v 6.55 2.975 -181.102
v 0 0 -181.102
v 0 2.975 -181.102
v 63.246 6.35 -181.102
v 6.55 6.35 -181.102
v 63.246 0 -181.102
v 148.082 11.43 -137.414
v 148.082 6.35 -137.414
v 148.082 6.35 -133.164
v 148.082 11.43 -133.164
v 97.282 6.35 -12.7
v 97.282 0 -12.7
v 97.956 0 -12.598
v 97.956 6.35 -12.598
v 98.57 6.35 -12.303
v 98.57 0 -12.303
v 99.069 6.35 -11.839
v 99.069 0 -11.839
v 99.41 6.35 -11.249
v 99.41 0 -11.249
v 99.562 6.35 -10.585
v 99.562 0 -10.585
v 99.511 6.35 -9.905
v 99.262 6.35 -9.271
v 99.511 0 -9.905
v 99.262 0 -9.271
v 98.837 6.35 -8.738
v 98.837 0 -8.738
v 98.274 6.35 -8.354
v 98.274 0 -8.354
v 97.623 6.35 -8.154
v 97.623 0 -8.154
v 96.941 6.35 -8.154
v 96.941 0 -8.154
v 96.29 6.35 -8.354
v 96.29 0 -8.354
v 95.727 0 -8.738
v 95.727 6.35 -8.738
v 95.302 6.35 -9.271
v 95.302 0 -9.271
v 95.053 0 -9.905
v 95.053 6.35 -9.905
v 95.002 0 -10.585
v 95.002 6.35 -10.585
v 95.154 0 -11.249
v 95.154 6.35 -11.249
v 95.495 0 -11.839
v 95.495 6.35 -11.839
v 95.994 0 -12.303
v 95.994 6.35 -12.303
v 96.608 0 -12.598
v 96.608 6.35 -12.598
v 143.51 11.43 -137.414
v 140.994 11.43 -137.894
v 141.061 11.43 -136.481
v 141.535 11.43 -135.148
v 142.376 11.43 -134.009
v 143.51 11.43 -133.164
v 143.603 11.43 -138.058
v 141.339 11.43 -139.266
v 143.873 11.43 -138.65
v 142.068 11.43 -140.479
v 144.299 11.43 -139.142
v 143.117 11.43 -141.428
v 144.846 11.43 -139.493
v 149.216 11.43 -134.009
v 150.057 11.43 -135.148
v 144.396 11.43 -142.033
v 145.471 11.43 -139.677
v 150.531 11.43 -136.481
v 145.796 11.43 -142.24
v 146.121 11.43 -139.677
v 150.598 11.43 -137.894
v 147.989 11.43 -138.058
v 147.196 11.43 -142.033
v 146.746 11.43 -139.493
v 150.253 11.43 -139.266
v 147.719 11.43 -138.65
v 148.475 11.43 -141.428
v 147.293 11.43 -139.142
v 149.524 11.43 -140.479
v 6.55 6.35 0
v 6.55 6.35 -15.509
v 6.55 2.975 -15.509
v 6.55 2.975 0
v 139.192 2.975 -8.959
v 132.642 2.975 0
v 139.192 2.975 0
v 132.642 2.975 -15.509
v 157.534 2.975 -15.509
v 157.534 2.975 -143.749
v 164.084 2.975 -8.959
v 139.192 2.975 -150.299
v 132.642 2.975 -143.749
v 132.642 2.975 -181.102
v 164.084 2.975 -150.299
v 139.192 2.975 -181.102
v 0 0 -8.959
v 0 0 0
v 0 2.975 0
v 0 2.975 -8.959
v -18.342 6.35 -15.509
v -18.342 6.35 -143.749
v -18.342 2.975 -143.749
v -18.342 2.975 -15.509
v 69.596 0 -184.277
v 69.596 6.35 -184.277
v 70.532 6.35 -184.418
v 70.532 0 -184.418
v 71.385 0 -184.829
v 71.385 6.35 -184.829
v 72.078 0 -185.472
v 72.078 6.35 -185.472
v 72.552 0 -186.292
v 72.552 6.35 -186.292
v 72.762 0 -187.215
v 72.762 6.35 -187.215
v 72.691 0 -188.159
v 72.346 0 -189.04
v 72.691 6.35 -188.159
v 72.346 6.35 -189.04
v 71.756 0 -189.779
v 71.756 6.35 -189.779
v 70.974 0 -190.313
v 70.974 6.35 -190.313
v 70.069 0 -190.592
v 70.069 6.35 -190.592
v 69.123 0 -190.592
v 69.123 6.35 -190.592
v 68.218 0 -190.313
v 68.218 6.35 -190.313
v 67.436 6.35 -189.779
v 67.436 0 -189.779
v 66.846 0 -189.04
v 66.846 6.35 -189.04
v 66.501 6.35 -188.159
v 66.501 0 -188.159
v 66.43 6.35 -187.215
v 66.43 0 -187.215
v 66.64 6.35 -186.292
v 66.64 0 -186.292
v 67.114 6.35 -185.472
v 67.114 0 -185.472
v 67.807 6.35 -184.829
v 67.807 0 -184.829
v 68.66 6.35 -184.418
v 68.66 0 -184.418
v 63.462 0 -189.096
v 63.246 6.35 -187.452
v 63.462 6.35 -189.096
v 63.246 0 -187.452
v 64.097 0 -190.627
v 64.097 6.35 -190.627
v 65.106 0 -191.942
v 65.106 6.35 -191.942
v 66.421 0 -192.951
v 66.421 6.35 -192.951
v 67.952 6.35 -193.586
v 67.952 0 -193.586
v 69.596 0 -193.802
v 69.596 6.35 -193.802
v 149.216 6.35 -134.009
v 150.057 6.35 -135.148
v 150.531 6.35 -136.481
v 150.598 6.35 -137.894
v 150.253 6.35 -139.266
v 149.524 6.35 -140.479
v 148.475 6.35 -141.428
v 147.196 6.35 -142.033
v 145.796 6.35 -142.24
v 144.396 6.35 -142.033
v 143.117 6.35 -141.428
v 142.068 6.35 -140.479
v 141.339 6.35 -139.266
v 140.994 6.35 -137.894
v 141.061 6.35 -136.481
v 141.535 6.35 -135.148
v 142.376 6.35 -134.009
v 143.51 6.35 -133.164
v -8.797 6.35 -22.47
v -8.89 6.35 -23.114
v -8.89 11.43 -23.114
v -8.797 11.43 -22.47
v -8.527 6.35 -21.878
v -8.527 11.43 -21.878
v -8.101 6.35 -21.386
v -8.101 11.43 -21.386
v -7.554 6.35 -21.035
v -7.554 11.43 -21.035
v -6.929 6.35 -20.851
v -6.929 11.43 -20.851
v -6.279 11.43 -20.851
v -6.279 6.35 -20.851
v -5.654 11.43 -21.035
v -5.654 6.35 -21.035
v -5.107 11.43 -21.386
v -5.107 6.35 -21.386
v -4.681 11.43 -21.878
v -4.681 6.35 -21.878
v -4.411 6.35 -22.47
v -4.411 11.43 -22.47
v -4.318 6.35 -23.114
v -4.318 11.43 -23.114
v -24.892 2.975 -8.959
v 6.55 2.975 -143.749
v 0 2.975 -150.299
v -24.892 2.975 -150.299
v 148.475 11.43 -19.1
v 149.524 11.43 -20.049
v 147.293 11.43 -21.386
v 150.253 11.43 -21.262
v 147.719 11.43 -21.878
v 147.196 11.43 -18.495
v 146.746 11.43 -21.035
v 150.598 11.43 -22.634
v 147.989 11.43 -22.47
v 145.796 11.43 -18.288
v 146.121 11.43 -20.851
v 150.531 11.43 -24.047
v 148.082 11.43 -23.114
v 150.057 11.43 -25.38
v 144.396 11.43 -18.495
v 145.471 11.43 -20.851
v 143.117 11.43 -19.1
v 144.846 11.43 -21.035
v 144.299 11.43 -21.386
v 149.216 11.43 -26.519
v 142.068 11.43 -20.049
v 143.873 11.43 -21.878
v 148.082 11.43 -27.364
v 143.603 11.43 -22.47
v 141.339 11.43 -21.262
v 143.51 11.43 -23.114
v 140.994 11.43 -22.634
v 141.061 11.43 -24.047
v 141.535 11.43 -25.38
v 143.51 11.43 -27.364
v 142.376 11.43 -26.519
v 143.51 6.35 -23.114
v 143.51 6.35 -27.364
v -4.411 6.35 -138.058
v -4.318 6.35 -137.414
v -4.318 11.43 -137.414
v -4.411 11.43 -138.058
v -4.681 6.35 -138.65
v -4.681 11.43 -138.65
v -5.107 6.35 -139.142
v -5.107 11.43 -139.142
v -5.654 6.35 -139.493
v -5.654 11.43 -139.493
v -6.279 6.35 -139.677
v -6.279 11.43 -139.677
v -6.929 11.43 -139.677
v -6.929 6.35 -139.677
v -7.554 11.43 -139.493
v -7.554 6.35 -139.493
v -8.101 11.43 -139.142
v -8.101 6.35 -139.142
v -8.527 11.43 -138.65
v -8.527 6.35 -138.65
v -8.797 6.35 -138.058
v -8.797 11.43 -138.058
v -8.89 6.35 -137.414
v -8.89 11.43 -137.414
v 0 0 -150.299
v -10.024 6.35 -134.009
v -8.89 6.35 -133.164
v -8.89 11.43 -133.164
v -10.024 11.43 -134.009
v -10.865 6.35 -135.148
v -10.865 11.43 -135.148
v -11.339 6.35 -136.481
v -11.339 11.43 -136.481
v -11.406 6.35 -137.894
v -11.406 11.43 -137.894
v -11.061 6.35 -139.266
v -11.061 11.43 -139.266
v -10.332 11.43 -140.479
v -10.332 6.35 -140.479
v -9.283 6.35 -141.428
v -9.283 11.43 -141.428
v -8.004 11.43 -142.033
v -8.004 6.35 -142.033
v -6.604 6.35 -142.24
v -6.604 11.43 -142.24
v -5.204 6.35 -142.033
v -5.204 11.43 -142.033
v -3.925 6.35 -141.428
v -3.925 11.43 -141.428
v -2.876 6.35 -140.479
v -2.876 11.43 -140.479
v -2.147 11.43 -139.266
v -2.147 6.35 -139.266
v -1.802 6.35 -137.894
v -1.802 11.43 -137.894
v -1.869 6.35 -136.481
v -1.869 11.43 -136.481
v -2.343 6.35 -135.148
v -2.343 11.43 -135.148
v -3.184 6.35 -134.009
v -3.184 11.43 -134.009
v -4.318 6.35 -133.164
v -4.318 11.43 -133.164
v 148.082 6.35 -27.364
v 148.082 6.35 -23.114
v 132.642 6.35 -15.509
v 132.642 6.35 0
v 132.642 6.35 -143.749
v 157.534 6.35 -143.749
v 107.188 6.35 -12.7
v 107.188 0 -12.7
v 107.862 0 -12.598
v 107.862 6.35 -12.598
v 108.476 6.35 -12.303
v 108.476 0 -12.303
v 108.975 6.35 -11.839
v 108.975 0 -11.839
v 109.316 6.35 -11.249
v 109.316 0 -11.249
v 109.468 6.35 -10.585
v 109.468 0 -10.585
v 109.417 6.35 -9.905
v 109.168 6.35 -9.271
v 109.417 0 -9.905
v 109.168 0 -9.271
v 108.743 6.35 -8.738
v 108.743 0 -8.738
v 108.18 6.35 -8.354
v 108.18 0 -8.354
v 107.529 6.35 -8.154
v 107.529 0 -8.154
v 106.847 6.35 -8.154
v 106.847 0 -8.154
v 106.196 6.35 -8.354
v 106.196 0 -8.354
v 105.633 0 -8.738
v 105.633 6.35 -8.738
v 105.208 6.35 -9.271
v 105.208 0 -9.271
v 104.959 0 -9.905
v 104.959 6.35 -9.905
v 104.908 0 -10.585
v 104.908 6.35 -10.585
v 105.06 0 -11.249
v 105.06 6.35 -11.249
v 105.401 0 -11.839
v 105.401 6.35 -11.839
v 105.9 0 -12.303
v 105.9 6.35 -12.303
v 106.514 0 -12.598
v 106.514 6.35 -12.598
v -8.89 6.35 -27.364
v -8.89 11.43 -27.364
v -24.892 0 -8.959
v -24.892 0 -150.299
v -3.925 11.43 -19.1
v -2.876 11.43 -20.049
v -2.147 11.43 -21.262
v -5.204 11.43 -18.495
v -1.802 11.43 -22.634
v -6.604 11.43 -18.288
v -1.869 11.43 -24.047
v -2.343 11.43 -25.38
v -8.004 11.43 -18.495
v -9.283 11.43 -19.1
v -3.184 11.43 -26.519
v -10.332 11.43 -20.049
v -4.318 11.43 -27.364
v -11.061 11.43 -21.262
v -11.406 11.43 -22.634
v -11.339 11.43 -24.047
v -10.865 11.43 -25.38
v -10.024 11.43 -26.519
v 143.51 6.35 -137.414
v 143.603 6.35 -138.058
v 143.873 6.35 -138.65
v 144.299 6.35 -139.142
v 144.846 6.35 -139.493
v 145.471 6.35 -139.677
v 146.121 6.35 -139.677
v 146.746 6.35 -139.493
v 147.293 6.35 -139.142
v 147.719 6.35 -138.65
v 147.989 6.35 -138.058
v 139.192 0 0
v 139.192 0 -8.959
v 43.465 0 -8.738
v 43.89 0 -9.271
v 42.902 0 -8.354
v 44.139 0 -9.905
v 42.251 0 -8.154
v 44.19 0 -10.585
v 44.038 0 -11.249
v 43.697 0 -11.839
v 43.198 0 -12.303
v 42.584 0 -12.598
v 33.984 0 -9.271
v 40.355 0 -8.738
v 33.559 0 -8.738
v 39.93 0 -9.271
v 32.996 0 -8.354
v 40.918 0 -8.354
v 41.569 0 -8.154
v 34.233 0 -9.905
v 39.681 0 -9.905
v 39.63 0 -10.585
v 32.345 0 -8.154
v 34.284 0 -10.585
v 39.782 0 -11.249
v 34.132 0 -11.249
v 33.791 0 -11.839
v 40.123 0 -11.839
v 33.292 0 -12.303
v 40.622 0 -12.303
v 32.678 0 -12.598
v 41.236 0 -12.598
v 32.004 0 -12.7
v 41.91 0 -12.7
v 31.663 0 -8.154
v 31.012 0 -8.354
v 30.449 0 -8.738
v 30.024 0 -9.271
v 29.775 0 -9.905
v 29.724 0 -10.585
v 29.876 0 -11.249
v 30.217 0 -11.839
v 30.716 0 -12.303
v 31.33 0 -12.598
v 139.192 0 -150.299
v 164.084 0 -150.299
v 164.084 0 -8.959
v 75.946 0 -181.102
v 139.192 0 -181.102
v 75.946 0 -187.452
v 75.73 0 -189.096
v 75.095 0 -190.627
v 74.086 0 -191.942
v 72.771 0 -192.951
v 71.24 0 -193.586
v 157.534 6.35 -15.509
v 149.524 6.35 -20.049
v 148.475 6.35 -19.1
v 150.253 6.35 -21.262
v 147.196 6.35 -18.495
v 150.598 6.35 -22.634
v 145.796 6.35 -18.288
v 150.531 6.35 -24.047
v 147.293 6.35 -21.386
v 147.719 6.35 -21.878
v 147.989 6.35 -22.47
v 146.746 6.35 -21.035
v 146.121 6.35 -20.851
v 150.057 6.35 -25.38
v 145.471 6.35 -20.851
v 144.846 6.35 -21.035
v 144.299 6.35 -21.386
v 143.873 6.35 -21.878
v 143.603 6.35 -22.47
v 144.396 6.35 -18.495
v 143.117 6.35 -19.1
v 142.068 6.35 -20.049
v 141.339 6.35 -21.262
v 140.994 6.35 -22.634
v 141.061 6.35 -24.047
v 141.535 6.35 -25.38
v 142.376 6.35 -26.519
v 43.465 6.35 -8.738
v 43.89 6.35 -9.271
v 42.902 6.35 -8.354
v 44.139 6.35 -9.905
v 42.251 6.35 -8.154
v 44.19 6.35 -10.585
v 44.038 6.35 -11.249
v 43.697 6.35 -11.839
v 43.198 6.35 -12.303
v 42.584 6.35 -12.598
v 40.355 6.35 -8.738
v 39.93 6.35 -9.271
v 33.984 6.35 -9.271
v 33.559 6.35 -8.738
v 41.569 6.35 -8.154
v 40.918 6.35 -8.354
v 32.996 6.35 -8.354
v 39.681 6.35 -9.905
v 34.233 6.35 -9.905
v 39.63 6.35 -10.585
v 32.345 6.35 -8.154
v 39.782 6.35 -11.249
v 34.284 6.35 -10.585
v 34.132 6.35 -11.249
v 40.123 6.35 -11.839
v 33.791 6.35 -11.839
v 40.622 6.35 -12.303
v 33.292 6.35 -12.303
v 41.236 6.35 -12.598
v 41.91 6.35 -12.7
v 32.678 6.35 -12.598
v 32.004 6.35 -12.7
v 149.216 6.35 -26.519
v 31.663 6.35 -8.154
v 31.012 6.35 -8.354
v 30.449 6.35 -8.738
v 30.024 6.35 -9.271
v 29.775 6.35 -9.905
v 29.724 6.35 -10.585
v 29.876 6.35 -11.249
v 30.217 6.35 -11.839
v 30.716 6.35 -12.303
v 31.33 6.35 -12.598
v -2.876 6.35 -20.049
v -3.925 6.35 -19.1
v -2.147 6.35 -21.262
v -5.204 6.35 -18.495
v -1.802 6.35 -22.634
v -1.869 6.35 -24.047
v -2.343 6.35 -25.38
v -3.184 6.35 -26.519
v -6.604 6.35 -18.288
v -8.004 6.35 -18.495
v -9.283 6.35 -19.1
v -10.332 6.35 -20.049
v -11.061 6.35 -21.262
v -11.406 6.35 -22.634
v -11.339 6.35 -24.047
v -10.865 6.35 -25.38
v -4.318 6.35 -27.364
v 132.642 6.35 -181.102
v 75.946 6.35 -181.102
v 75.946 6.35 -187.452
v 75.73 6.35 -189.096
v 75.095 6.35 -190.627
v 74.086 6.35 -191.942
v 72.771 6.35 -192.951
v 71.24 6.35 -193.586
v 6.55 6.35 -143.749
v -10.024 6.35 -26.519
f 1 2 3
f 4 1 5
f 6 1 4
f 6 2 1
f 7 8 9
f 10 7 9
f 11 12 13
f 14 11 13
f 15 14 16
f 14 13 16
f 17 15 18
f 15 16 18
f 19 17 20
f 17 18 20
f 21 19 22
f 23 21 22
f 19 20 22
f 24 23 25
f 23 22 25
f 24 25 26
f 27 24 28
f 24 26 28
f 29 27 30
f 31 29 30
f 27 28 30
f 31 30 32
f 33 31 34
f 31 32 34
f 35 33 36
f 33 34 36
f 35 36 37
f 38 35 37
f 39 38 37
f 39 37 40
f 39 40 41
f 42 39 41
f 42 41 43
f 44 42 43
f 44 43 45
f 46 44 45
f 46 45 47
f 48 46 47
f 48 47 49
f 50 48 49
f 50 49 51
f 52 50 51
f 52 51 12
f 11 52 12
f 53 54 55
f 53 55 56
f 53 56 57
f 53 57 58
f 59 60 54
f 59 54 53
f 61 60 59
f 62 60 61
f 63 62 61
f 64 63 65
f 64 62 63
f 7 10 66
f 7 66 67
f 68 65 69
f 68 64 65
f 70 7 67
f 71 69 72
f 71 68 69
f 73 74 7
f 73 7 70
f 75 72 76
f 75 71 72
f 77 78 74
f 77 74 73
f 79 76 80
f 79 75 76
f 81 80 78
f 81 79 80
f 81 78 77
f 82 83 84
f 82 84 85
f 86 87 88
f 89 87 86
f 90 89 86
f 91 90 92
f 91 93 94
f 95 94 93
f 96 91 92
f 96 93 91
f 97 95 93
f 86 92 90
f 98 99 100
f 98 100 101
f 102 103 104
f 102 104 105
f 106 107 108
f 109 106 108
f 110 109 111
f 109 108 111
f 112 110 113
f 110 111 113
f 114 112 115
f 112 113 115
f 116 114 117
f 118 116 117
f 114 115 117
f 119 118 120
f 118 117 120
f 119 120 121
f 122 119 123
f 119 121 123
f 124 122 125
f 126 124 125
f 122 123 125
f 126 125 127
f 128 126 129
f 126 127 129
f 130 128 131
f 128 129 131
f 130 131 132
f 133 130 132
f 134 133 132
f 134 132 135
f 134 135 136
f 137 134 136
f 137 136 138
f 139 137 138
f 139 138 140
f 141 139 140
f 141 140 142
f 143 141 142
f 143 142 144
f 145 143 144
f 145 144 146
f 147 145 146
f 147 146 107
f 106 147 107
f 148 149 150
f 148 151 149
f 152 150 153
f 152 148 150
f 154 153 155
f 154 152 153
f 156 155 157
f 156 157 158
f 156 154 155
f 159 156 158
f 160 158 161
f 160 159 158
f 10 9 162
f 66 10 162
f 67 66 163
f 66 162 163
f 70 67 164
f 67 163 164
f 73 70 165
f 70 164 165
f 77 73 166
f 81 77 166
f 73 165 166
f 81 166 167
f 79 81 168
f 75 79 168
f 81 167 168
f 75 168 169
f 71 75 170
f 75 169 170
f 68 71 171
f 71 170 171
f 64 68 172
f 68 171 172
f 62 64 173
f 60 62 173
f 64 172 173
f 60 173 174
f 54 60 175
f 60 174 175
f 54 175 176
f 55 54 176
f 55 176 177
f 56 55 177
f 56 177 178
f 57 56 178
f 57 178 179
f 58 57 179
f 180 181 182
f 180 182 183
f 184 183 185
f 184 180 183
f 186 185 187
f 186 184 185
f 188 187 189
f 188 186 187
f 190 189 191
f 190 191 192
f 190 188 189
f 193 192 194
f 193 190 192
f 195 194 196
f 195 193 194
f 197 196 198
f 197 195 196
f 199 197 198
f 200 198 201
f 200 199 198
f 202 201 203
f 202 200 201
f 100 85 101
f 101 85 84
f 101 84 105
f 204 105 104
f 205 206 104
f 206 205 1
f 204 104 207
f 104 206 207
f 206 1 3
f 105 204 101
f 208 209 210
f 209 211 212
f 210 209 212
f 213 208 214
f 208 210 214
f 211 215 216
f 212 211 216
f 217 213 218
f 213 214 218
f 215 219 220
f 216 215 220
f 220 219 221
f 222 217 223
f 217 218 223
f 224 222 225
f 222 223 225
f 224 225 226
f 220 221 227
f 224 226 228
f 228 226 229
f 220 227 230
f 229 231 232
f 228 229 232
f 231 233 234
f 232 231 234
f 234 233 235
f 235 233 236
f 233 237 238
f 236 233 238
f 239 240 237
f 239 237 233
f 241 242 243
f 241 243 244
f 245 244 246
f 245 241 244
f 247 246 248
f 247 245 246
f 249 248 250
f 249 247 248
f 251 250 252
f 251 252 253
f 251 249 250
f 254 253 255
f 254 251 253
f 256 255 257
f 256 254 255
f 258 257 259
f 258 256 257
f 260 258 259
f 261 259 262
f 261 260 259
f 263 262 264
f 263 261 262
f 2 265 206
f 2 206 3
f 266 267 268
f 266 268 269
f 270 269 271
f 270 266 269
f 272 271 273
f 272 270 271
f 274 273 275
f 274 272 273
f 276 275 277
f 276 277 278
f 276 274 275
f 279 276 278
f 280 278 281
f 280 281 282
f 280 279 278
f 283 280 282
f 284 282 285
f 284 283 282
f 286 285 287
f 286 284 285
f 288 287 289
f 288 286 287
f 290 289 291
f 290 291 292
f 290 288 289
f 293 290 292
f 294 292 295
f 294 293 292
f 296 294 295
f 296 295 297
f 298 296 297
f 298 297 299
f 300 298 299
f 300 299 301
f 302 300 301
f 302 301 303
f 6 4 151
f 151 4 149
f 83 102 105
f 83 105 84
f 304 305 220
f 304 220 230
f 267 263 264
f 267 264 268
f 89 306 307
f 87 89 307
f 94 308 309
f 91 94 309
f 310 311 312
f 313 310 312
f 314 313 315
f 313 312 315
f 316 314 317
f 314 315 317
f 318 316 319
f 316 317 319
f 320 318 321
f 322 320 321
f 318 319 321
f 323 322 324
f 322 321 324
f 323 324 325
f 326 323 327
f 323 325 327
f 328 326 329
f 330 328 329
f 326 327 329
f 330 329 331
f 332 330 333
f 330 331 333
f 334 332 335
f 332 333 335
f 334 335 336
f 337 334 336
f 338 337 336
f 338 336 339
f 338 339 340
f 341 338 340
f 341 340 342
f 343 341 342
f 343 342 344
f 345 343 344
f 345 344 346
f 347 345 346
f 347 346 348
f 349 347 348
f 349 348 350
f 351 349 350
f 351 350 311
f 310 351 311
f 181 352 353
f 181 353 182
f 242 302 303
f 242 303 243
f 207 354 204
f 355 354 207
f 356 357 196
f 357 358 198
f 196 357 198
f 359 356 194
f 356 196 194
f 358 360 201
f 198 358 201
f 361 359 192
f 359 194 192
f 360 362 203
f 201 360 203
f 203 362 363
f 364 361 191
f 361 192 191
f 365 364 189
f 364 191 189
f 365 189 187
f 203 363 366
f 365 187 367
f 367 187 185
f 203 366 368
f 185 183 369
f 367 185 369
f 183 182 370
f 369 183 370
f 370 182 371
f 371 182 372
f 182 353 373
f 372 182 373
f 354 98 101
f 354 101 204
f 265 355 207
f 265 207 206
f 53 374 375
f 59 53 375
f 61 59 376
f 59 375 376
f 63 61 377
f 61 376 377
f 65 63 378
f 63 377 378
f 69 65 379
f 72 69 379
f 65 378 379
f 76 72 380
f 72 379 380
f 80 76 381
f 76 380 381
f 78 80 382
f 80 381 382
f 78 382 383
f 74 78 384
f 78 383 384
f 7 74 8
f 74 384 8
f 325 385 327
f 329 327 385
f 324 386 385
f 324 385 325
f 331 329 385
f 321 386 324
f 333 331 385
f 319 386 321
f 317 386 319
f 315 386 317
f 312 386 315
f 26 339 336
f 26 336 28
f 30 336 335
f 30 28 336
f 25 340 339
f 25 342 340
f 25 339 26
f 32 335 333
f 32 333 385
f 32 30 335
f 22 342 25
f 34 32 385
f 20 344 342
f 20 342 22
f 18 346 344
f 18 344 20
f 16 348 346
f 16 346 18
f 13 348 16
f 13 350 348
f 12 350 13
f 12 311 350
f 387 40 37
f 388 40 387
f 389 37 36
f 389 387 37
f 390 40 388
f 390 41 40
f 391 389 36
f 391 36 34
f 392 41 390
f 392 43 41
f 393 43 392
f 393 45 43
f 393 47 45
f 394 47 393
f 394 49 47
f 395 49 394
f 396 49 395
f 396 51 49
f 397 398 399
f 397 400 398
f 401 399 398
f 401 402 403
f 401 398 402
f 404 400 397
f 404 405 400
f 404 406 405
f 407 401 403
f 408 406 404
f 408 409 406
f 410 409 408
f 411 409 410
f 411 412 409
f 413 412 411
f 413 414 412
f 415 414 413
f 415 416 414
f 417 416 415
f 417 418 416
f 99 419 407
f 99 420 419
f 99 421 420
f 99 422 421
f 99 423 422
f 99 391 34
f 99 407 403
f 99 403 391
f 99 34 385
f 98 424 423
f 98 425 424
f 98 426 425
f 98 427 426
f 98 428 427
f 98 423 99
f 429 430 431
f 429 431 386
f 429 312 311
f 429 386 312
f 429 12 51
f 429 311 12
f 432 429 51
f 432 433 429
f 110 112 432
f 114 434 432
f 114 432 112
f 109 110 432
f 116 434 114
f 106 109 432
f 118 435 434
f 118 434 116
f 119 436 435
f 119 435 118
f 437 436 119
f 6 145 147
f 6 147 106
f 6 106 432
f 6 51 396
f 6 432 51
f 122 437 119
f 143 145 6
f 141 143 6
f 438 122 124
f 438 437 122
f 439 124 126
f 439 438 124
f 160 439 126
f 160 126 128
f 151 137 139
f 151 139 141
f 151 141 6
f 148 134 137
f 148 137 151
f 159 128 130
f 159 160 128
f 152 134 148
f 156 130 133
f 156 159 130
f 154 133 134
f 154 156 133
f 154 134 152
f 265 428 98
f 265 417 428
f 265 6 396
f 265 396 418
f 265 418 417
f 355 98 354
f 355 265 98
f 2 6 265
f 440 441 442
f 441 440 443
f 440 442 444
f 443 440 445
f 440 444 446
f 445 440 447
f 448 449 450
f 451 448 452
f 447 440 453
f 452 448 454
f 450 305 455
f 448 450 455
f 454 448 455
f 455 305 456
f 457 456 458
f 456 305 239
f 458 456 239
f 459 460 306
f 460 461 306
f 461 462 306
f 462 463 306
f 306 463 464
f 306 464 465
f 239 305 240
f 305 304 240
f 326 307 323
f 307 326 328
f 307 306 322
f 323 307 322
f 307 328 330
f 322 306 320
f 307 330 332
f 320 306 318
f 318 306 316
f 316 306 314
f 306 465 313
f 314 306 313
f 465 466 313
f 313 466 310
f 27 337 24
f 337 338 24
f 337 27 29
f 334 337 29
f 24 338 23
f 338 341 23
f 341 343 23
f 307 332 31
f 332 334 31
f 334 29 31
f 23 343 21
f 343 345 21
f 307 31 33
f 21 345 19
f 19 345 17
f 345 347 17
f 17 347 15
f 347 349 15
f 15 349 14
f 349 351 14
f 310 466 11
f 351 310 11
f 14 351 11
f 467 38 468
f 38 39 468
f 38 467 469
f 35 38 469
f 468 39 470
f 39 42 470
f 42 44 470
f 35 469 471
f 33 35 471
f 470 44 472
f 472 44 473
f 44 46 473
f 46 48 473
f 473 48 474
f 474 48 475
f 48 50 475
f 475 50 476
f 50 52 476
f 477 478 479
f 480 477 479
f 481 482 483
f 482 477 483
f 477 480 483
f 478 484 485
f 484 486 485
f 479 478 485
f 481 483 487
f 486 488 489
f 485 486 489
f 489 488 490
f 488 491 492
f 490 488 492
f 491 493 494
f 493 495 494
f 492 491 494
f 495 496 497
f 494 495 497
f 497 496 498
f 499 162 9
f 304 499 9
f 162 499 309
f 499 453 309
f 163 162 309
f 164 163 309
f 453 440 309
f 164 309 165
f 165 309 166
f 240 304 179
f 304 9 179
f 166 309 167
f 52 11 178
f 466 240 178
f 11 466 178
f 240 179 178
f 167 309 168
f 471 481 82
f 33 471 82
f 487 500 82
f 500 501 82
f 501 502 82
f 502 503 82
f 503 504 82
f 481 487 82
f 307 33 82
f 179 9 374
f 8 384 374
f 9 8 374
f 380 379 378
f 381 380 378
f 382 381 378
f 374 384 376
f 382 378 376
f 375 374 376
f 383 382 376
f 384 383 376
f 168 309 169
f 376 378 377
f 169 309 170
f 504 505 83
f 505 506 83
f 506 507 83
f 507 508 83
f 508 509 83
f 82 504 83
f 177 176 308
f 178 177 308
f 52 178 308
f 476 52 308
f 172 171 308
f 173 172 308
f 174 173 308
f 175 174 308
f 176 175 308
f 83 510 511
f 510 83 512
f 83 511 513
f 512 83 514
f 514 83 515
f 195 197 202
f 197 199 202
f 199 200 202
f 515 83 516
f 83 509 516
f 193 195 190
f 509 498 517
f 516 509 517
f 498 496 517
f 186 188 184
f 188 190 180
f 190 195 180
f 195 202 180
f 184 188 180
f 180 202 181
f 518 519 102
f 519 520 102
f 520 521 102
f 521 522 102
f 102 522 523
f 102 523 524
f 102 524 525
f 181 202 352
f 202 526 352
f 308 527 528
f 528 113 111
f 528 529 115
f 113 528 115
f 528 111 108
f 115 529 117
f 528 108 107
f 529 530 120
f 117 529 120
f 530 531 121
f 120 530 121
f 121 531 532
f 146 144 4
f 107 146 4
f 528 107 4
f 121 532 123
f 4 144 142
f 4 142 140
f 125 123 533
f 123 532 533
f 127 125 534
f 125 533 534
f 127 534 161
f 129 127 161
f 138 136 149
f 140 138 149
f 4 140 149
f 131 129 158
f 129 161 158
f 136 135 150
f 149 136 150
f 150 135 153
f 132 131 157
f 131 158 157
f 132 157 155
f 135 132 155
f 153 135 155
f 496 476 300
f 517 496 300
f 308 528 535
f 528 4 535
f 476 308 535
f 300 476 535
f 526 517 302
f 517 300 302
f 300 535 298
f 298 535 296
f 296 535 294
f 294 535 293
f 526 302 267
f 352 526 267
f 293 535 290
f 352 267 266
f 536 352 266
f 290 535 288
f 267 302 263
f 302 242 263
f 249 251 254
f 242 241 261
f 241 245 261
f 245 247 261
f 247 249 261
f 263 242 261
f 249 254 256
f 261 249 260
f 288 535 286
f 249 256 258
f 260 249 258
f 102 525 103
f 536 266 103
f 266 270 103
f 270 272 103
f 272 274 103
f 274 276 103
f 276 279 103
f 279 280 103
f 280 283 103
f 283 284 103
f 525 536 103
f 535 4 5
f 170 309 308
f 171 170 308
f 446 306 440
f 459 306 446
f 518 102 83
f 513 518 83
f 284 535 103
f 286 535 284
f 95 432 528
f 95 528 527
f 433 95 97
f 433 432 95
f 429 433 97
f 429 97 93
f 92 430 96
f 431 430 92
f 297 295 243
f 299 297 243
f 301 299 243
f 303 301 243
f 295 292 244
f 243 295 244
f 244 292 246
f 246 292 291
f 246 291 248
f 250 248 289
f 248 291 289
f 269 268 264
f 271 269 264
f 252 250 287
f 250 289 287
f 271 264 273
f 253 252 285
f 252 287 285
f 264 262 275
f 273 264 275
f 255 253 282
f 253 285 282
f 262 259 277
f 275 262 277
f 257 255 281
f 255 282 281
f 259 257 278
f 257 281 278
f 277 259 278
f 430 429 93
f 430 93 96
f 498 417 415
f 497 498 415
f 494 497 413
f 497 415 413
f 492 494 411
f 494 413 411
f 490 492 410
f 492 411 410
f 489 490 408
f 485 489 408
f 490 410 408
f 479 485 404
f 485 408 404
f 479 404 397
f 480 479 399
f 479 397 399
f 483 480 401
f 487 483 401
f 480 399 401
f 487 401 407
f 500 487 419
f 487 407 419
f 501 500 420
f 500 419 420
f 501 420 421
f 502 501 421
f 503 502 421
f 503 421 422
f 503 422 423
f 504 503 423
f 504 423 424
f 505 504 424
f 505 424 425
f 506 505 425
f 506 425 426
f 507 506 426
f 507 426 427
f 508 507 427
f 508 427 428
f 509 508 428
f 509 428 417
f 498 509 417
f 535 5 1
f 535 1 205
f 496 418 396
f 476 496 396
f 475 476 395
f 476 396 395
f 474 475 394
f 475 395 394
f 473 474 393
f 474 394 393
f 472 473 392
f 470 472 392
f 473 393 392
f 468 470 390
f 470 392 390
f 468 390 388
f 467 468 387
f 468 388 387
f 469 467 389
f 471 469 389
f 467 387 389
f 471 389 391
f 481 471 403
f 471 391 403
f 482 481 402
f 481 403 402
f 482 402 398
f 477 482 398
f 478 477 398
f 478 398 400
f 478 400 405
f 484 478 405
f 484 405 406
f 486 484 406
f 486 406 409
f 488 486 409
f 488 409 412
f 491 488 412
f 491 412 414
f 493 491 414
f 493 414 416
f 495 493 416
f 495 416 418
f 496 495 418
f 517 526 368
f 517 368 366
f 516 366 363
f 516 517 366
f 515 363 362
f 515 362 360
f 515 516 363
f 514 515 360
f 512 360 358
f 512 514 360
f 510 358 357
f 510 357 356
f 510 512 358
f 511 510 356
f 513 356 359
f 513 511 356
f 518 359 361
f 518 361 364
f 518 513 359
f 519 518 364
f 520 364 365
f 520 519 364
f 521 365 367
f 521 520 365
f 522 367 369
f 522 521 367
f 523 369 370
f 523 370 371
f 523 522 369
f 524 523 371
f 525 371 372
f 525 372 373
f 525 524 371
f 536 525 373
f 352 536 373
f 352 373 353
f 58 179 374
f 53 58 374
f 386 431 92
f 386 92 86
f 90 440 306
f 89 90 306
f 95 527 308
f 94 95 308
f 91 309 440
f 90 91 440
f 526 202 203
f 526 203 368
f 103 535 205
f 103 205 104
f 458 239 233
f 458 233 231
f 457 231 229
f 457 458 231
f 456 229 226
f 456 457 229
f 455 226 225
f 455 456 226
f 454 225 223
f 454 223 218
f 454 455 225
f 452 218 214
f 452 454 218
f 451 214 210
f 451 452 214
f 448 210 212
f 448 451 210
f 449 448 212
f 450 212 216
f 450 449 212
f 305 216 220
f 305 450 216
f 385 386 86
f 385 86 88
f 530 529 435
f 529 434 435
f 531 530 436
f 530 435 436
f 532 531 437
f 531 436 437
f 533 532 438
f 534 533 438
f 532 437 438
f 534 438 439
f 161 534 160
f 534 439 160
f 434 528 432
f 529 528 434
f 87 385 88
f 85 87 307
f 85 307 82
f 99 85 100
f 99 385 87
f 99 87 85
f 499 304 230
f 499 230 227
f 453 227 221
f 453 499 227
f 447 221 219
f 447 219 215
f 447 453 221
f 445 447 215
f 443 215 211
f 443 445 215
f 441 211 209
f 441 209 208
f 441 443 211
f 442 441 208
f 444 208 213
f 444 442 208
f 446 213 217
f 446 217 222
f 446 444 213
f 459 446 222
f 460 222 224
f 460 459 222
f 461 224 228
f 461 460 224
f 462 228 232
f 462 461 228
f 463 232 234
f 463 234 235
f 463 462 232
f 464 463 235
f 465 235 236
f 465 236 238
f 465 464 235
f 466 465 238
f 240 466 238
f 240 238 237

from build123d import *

# Parameters (mm, degrees)
BOSS_EXTRUDE1_DEPTH = 6.35
CUT_EXTRUDE1_DEPTH  = 3.375
SKETCH3_W           = 12.7
SKETCH3_H           = 12.7
BOSS_EXTRUDE2_DEPTH = 6.35
FILLET1_R           = 6.35
SKETCH4_R           = 3.175
CUT_EXTRUDE2_DEPTH  = 255.013969616
SKETCH5_R           = 2.286
CUT_EXTRUDE3_DEPTH  = 12.7
BOSS_EXTRUDE3_DEPTH = 5.08


with BuildPart() as part:
    # Sketch1 → Boss-Extrude1 (new body)
    with BuildSketch(Plane(origin=(0, 0, 0), x_dir=(1, 0, 0), z_dir=(0, 1, 0))):
        Polygon((0, 150.29942), (0, 181.102), (139.192, 181.102), (139.192, 150.29942), (164.084, 150.29942), (164.084, 8.95858), (139.192, 8.95858), (139.192, 0), (0, 0), (0, 8.95858), (-24.892, 8.95858), (-24.892, 150.29942), align=None)
    extrude(amount=BOSS_EXTRUDE1_DEPTH)

    # Sketch2 → Cut-Extrude1 (cut)
    with BuildSketch(Plane(origin=(0, 6.35, 0), x_dir=(1, 0, 0), z_dir=(0, 1, 0))):
        Polygon((132.6420004, 181.102), (132.6420004, 143.7494204), (157.5340004, 143.7494204), (157.5340004, 15.5085796), (132.6420004, 15.5085796), (132.6420004, 0), (139.192, 0), (139.192, 8.95858), (164.084, 8.95858), (164.084, 150.29942), (139.192, 150.29942), (139.192, 181.102), align=None)
        Polygon((0, 181.102), (6.5499996, 181.102), (6.5499996, 143.7494204), (-18.3420004, 143.7494204), (-18.3420004, 15.5085796), (6.5499996, 15.5085796), (6.5499996, 0), (0, 0), (0, 8.95858), (-24.892, 8.95858), (-24.892, 150.29942), (0, 150.29942), align=None)
    extrude(amount=-CUT_EXTRUDE1_DEPTH, mode=Mode.SUBTRACT)

    # Sketch3 → Boss-Extrude2 (add)
    with BuildSketch(Plane(origin=(0, 6.35, 0), x_dir=(1, 0, 0), z_dir=(0, 1, 0))):
        with Locations((69.596, 187.452)):
            Rectangle(SKETCH3_W, SKETCH3_H)
    extrude(amount=-BOSS_EXTRUDE2_DEPTH)

    # Fillet1
    fillet1_edges = [part.edges().sort_by_distance(p)[0] for p in [
        (63.246, 3.175, -193.802),
        (75.946, 3.175, -193.802),
    ]]
    fillet(fillet1_edges, radius=FILLET1_R - 0.0001)  # a hair under: the kernel refuses the full size

    # Sketch4 → Cut-Extrude2 (cut, through all)
    with BuildSketch(Plane(origin=(0, 6.35, 0), x_dir=(1, 0, 0), z_dir=(0, 1, 0))):
        with Locations(Location((69.596, 187.452, 0), (0, 0, 270))):
            Circle(SKETCH4_R)
    extrude(amount=-CUT_EXTRUDE2_DEPTH, mode=Mode.SUBTRACT)

    # Sketch5 → Cut-Extrude3 (cut)
    with BuildSketch(Plane.XZ):
        with Locations(Location((107.188, -10.414, 0), (0, 0, 270))):
            Circle(SKETCH5_R)
        with Locations(Location((97.282, -10.414, 0), (0, 0, 270))):
            Circle(SKETCH5_R)
        with Locations(Location((41.91, -10.414, 0), (0, 0, 270))):
            Circle(SKETCH5_R)
        with Locations(Location((32.004, -10.414, 0), (0, 0, 270))):
            Circle(SKETCH5_R)
    extrude(amount=-CUT_EXTRUDE3_DEPTH, mode=Mode.SUBTRACT)

    # Sketch6 → Boss-Extrude3 (add)
    with BuildSketch(Plane(origin=(0, 6.35, 0), x_dir=(1, 0, 0), z_dir=(0, 1, 0))):
        with BuildLine():
            Line((-4.318, 23.114), (-4.318, 27.364232935))
            ThreePointArc((-4.318, 27.364232935), (-6.604, 18.288), (-8.89, 27.364232935))
            Line((-8.89, 27.364232935), (-8.89, 23.114))
            ThreePointArc((-8.89, 23.114), (-6.604, 20.828), (-4.318, 23.114))
        make_face()
        with BuildLine():
            Line((-8.89, 137.414), (-8.89, 133.163767065))
            ThreePointArc((-8.89, 133.163767065), (-6.604, 142.24), (-4.318, 133.163767065))
            Line((-4.318, 133.163767065), (-4.318, 137.414))
            ThreePointArc((-4.318, 137.414), (-6.604, 139.7), (-8.89, 137.414))
        make_face()
        with BuildLine():
            Line((148.082, 23.114), (148.082, 27.364232935))
            ThreePointArc((148.082, 27.364232935), (145.796, 18.288), (143.51, 27.364232935))
            Line((143.51, 27.364232935), (143.51, 23.114))
            ThreePointArc((143.51, 23.114), (145.796, 20.828), (148.082, 23.114))
        make_face()
        with BuildLine():
            Line((148.082, 137.414), (148.082, 133.163767065))
            ThreePointArc((148.082, 133.163767065), (145.796, 142.24), (143.51, 133.163767065))
            Line((143.51, 133.163767065), (143.51, 137.414))
            ThreePointArc((143.51, 137.414), (145.796, 139.7), (148.082, 137.414))
        make_face()
    extrude(amount=BOSS_EXTRUDE3_DEPTH)


solid = part.part
